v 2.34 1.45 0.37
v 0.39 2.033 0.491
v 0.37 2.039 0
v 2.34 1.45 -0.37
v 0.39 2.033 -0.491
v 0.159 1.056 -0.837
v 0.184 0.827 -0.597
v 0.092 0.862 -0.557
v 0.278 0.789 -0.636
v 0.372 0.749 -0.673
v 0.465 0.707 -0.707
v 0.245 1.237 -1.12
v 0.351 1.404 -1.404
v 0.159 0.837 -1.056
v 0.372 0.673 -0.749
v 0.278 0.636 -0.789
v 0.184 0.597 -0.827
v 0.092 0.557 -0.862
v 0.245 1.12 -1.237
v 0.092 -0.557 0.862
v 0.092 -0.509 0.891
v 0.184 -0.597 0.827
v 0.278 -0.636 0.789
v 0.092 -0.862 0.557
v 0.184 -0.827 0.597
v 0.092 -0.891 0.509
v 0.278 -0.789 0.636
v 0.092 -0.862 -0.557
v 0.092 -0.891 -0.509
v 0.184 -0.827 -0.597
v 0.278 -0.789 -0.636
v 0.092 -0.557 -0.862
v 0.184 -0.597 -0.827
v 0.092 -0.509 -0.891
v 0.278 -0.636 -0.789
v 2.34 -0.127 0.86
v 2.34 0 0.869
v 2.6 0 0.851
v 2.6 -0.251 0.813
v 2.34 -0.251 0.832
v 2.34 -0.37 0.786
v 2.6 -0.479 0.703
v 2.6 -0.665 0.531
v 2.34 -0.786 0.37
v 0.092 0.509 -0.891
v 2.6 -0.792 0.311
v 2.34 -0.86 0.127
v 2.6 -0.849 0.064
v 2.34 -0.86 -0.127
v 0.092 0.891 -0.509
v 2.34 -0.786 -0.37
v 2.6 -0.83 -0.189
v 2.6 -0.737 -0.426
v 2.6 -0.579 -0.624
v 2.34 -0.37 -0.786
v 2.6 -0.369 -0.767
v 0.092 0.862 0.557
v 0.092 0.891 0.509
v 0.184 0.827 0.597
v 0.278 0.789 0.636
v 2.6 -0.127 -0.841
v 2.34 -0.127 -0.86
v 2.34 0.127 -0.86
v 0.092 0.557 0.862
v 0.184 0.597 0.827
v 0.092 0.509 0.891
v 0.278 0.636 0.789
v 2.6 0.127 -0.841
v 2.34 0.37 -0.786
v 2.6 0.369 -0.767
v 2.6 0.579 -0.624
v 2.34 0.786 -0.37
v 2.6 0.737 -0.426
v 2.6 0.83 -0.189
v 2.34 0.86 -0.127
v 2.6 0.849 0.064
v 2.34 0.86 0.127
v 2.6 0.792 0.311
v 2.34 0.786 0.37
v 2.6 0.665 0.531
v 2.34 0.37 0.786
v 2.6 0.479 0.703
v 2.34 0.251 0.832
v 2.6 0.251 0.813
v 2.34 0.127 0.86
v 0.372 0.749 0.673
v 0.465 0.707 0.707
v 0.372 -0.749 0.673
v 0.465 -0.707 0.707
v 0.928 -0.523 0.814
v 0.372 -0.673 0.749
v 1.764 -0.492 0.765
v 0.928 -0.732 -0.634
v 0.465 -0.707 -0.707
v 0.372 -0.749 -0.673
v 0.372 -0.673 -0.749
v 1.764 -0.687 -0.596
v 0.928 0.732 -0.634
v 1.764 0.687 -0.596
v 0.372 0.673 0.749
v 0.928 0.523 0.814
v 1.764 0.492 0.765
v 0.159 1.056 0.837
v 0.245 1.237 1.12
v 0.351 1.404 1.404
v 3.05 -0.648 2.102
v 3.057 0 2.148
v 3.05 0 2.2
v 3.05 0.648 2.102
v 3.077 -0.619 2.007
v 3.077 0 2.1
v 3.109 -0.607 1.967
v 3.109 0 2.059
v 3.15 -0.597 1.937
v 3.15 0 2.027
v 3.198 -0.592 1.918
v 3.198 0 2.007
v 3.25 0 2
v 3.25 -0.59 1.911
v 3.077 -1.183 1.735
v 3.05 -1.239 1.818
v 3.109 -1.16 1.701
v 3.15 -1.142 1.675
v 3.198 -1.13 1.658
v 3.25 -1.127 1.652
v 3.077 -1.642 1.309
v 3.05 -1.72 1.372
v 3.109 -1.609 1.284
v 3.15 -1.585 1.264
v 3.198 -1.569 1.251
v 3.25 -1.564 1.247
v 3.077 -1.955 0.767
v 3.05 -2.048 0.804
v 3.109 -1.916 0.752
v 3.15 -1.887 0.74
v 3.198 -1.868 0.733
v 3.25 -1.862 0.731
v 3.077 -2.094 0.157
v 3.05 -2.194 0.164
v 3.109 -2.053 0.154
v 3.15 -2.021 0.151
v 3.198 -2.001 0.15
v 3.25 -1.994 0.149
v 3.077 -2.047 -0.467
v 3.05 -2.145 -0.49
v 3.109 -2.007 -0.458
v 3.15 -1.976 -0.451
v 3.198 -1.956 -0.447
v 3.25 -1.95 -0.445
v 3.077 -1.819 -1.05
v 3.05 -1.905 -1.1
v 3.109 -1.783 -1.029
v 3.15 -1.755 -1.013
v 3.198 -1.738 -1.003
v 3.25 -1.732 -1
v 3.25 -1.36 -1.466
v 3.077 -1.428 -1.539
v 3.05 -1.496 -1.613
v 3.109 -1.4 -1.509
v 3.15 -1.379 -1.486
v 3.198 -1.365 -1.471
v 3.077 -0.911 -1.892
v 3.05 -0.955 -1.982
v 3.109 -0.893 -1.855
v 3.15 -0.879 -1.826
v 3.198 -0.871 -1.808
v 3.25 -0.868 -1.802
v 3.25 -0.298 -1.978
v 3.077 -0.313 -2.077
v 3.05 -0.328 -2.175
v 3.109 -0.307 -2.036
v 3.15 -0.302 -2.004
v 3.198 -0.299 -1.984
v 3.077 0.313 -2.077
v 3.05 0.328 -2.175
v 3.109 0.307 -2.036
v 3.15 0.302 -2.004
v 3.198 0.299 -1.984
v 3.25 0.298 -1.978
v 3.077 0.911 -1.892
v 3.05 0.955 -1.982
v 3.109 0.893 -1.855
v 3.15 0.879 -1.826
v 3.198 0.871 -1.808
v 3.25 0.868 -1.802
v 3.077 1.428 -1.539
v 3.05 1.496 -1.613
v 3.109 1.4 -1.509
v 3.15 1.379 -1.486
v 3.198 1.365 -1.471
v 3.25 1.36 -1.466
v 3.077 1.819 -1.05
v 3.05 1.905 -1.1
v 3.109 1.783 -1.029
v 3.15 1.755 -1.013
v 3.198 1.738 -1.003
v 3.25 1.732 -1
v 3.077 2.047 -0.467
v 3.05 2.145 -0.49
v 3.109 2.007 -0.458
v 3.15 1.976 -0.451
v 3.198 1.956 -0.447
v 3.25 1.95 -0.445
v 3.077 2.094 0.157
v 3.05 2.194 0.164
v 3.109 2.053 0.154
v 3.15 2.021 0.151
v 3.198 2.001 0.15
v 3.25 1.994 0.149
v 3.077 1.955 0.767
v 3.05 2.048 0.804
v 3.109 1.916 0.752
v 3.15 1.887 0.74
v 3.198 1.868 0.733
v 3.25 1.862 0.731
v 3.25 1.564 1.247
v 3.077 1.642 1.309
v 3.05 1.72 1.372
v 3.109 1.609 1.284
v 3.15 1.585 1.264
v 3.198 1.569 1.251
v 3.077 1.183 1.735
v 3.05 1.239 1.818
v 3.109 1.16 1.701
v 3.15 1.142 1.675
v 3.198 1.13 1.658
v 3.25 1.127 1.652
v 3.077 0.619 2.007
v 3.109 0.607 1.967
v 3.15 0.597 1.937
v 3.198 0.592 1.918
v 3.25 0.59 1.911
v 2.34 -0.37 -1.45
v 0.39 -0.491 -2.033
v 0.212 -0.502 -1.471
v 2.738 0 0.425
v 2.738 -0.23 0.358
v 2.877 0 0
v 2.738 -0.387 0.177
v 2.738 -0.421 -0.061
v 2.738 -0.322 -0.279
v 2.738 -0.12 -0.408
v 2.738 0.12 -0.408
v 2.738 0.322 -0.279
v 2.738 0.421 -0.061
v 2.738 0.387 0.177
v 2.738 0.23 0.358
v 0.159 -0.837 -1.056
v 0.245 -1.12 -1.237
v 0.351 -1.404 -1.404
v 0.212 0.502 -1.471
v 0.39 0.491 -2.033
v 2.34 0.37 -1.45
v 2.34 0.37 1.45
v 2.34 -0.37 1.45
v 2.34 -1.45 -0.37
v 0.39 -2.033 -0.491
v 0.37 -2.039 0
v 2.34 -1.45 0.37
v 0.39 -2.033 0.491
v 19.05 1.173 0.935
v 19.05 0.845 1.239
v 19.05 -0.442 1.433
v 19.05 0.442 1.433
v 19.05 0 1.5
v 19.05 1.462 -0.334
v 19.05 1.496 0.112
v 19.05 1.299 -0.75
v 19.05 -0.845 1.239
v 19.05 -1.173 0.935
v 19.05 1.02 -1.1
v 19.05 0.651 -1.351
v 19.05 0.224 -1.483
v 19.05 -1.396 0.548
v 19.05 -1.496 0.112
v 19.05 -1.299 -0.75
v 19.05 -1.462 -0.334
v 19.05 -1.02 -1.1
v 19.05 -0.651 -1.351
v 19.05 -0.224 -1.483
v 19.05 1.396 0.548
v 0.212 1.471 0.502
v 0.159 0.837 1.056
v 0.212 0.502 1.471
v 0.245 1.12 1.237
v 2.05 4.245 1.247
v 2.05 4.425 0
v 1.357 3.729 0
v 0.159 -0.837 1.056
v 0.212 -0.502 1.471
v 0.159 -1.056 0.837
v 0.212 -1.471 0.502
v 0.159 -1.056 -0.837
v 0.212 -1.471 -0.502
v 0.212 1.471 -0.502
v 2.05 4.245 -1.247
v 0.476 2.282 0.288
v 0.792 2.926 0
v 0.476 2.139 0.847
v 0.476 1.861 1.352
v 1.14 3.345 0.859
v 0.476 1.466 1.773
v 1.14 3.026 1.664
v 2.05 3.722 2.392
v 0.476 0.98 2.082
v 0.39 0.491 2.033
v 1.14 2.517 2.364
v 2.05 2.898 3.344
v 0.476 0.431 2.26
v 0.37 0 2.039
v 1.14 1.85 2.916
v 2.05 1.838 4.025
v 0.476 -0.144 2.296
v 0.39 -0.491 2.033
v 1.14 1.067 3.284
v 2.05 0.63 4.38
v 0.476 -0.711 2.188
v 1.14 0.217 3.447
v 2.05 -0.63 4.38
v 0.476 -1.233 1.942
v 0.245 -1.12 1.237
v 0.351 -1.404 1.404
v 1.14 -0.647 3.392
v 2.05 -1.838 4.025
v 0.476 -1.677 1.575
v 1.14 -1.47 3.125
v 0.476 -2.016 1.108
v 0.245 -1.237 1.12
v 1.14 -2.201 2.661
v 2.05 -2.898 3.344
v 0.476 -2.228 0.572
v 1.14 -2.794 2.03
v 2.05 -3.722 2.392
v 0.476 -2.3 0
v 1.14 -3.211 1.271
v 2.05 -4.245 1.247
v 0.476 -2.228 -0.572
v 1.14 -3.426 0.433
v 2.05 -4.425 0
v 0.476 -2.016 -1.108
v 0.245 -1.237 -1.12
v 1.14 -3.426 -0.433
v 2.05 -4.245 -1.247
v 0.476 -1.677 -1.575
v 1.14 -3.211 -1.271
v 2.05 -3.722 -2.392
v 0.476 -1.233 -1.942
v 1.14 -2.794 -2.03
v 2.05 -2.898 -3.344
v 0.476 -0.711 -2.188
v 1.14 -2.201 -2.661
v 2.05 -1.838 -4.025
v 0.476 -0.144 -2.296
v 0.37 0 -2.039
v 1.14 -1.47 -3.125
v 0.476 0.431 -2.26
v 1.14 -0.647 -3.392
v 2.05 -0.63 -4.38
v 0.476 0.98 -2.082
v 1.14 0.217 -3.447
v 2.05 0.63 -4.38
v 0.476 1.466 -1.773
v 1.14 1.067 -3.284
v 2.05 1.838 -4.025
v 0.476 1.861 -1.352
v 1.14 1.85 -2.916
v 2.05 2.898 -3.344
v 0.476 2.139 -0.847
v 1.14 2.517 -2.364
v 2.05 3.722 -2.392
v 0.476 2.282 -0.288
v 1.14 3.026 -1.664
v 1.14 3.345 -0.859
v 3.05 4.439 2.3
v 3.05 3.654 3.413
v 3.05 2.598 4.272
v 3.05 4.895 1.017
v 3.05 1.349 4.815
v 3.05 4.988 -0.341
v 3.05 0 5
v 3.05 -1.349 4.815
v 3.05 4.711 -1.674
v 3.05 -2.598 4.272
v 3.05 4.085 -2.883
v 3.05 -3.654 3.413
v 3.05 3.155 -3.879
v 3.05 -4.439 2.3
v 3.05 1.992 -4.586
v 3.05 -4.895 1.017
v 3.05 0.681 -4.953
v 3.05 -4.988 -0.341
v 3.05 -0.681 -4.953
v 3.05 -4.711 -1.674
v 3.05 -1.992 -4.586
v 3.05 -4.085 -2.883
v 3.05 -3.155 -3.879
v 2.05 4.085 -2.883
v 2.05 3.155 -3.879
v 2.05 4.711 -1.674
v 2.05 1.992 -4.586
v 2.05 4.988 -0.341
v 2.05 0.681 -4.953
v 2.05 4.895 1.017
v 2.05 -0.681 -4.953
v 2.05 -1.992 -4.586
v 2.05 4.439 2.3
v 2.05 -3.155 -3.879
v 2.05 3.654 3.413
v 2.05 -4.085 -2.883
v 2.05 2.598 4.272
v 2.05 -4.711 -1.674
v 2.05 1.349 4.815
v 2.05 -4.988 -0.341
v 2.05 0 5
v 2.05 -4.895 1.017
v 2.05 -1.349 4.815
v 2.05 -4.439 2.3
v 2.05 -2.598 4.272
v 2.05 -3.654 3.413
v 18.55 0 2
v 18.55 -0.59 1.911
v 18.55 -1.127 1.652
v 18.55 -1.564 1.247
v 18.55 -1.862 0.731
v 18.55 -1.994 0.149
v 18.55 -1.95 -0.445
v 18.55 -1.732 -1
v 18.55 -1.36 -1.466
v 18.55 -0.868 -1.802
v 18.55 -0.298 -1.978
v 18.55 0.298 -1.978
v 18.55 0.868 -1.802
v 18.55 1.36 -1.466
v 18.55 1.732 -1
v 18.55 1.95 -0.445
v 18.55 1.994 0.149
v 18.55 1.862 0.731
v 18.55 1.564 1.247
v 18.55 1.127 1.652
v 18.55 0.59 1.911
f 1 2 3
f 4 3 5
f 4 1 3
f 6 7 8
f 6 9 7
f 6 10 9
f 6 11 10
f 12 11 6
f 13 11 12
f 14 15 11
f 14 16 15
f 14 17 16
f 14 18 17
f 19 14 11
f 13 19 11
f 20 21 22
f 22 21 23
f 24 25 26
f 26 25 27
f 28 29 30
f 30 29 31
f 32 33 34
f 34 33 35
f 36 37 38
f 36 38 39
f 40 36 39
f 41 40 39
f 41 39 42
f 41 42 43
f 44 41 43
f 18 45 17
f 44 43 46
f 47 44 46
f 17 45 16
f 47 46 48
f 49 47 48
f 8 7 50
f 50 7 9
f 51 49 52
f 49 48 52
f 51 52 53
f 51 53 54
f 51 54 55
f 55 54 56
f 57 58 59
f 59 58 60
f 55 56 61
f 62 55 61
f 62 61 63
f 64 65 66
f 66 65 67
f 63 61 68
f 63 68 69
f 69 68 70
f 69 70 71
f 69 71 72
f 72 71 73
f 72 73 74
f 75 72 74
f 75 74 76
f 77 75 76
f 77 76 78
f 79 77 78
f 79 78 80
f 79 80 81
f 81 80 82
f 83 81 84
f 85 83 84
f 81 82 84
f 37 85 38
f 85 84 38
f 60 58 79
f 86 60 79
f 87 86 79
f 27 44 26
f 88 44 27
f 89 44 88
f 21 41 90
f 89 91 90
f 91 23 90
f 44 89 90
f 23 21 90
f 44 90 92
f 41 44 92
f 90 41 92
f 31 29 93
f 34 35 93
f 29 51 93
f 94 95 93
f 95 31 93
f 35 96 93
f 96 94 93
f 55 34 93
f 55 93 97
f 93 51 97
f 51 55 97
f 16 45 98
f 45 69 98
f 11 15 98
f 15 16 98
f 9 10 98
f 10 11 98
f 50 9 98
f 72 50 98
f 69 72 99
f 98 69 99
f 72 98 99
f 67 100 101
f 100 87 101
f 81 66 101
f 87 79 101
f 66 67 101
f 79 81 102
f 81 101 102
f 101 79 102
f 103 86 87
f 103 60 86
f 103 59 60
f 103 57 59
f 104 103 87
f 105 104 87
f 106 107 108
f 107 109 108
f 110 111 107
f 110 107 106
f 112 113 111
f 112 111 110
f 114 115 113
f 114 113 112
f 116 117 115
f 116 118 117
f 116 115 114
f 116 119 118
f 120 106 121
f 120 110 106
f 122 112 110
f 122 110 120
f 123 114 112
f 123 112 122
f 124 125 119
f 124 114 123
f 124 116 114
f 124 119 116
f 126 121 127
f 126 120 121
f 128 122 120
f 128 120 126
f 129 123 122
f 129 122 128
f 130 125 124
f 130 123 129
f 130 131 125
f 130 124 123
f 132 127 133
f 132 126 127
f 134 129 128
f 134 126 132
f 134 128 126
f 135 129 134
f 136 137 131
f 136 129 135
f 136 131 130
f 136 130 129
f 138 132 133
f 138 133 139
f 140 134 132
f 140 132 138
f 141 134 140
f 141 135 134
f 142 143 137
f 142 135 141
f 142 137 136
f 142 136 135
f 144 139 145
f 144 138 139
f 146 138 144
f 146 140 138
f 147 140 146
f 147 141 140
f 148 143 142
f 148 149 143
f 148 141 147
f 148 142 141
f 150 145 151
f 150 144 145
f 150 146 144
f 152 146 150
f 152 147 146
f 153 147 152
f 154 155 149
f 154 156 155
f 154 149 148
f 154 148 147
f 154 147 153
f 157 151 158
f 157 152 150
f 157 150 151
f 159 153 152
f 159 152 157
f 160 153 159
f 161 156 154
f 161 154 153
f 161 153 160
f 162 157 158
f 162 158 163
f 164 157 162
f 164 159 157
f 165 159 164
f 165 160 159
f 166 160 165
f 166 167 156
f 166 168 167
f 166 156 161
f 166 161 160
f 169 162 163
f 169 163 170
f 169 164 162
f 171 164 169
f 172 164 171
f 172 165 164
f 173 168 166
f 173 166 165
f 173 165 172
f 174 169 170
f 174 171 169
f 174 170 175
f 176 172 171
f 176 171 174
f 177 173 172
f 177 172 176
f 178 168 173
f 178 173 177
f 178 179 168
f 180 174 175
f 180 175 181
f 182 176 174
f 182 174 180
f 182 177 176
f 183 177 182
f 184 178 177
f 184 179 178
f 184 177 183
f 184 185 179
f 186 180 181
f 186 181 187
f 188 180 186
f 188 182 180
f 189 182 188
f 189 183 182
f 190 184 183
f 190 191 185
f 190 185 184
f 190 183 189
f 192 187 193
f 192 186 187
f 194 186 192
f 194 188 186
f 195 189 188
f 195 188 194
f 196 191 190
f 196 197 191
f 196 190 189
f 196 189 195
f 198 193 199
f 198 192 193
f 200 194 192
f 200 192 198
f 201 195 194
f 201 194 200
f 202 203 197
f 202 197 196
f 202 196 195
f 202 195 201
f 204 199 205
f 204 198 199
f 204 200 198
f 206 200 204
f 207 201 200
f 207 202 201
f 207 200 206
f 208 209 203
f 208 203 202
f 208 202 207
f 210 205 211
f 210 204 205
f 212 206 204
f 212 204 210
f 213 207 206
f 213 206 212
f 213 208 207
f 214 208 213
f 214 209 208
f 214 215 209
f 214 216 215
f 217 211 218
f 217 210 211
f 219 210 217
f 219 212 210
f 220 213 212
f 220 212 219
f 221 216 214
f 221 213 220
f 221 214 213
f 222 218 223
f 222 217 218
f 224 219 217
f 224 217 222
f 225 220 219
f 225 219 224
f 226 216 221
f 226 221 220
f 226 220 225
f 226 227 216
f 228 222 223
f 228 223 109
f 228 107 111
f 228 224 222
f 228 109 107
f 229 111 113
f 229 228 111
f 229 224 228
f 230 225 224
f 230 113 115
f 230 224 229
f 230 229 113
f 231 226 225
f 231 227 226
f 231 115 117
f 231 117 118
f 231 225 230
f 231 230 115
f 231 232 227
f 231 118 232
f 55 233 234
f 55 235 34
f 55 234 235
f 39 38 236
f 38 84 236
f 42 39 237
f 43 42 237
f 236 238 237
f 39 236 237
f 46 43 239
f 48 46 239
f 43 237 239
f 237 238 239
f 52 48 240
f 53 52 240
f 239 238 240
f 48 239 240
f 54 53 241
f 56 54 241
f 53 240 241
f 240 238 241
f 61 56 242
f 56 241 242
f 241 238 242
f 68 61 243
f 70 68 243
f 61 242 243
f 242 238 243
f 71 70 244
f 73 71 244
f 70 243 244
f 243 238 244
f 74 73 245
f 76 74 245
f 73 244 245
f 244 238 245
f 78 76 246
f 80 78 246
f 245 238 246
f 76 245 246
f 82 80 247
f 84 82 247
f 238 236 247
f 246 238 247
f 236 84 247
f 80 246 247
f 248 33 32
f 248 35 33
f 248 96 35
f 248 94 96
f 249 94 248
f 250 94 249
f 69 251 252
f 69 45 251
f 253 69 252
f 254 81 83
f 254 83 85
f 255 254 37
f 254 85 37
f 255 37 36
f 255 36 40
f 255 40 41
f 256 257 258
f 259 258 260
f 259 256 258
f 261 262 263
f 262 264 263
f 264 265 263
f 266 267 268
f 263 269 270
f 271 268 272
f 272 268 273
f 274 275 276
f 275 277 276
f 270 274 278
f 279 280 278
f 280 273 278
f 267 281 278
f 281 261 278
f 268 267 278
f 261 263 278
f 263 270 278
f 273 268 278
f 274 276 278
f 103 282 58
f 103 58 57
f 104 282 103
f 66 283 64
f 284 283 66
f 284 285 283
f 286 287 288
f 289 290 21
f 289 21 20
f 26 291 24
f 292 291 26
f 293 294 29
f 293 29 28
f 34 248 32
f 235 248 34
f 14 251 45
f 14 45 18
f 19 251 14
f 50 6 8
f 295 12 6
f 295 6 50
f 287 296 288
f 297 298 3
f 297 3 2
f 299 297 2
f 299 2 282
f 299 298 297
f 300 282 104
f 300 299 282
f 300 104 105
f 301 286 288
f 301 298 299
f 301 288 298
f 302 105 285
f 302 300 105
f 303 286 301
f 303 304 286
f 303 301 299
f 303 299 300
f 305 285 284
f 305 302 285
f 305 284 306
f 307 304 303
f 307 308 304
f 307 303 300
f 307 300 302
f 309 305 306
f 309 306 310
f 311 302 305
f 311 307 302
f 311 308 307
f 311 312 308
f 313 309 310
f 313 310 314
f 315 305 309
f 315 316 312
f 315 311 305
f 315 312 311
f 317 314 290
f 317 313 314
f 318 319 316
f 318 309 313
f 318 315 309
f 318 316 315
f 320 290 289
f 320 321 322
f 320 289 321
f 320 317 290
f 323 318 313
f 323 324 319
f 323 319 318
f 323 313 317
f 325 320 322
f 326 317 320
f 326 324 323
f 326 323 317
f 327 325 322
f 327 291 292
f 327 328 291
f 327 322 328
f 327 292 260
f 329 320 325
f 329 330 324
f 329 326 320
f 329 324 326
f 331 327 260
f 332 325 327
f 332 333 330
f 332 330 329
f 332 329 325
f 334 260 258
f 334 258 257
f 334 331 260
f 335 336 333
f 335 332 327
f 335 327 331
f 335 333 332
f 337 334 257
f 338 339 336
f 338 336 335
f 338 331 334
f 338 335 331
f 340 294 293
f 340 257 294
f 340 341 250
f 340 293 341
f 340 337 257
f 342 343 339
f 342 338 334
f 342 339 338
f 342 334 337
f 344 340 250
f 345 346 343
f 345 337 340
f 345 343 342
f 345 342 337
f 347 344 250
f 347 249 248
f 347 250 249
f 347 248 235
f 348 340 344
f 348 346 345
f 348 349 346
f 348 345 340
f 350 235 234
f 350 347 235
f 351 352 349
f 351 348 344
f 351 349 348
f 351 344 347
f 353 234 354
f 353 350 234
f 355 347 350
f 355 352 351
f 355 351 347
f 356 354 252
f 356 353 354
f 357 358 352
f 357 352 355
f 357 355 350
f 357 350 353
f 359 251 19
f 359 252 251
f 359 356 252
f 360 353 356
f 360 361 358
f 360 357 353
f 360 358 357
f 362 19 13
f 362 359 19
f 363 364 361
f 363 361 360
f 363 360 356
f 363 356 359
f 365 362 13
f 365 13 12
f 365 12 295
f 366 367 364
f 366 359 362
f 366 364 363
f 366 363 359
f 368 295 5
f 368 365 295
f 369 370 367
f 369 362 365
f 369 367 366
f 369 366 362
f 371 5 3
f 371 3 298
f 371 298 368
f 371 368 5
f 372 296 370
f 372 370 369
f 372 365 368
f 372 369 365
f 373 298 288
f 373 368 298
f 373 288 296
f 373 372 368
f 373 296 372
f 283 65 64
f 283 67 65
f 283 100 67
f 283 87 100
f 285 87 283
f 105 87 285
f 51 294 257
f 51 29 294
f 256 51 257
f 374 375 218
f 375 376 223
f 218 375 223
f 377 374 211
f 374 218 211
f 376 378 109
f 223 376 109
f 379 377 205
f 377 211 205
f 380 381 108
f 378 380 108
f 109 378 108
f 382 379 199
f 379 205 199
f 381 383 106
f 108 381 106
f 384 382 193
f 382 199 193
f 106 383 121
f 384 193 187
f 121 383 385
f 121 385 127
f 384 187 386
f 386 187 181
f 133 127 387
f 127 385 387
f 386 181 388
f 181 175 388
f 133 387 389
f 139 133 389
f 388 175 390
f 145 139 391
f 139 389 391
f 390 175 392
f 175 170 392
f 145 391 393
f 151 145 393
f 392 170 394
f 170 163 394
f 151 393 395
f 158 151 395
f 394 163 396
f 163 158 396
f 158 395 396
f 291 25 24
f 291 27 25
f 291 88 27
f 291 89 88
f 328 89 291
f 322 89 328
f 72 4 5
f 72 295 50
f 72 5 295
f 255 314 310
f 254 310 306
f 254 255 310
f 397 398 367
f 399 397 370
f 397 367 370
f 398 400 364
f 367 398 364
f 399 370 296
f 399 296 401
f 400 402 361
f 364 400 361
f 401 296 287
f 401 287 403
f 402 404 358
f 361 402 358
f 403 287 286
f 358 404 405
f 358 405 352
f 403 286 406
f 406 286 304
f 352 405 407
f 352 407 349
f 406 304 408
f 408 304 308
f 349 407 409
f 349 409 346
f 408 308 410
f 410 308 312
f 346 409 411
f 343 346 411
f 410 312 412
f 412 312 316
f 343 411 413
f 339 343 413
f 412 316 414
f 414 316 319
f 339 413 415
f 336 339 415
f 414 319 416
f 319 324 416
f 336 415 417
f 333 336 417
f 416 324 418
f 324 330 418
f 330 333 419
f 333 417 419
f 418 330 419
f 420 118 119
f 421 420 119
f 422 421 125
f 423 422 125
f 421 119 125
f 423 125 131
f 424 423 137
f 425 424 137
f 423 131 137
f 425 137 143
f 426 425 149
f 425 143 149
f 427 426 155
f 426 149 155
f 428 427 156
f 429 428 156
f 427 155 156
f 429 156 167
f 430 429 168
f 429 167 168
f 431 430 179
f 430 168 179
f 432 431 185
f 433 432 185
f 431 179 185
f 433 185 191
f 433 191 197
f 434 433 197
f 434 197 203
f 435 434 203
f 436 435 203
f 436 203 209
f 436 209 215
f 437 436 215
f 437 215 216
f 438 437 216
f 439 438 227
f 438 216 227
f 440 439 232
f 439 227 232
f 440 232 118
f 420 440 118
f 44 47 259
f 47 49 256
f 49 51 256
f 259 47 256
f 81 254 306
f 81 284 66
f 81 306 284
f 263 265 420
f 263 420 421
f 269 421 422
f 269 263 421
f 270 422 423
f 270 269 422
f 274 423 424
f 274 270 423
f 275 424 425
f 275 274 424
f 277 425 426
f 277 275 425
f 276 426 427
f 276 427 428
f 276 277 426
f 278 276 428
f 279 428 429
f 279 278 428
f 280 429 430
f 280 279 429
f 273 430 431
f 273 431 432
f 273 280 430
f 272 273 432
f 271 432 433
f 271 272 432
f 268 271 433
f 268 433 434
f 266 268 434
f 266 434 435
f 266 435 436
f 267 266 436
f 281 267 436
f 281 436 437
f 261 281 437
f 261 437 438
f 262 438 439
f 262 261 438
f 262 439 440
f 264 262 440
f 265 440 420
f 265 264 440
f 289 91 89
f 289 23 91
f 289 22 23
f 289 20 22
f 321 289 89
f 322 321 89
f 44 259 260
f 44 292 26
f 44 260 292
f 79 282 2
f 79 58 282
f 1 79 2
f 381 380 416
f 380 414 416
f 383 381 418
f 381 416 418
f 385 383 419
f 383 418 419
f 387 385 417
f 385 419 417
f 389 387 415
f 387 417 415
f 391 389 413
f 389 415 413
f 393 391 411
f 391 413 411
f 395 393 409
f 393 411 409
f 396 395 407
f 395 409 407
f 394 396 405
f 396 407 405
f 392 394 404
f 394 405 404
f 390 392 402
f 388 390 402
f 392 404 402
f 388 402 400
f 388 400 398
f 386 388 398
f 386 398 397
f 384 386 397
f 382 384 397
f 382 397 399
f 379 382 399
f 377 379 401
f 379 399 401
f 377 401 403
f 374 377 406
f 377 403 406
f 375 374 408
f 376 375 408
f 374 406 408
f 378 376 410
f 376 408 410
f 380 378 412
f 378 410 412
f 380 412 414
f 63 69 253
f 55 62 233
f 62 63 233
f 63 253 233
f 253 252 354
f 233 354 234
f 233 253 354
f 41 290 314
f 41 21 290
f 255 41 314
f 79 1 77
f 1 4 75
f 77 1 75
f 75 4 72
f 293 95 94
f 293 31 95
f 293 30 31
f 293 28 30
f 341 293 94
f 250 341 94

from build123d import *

# Parameters (mm, degrees)
FILLET1_R             = 0.2
RECPAT_COUNT          = 2
RECPAT_ANGLE          = 90
CHAMFER_1_SIZE        = 0.5
CUT_EXTRUDE_START     = -1.932317225
CUT_EXTRUDE_1_DEPTH   = 0.992538955
CUT_EXTRUDE_1_2_DEPTH = 0.992538955
CUT_EXTRUDE_1_3_DEPTH = 0.992538955
CUT_EXTRUDE_1_4_DEPTH = 0.992538955


# Read off the part's stored shape, not the designer's step: Вытянуть1
with BuildPart() as part:
    # BodySke → Base-Revolve (revolve)
    with BuildSketch(Plane.XY, mode=Mode.PRIVATE) as base_revolve_sk:
        Polygon((3.05, 2), (3.05, 5), (2.05, 5), (2.05, 0), (19.05, 0), (19.05, 2), align=None)
    revolve(base_revolve_sk.sketch.rotate(Axis((-6.35, 0, 0), (1, 0, 0)), 90), axis=Axis((-6.35, 0, 0), (1, 0, 0)))

    # Fillet1
    fillet1_edges = [part.edges().sort_by_distance(p)[0] for p in [
        (3.05, 0, -2),
    ]]
    fillet(fillet1_edges, radius=FILLET1_R)

    # PanSke → Pan (revolve)
    with BuildSketch(Plane.XY):
        with BuildLine():
            Line((2.05, 4.424646879), (2.05, 0))
            Line((2.05, 0), (0, 0))
            ThreePointArc((0, 0), (0.537396082, 2.438237068), (2.05, 4.424646879))
        make_face()
    revolve(axis=Axis((0, 0, 0), (1, 0, 0)))

    # Sketch3 → Recess section 0
    with BuildSketch(Plane(origin=(0, 0, 0), x_dir=(0, 0, -1), z_dir=(1, 0, 0))):
        with BuildLine():
            Line((-0.515, 2.15), (0.515, 2.15))
            Line((0.515, 2.15), (0.515, -2.15))
            Line((0.515, -2.15), (-0.515, -2.15))
            Line((-0.515, -2.15), (-0.515, 2.15))
        make_face()
    # Sketch4 → Recess section 1
    with BuildSketch(Plane(origin=(2.34, 0, 0), x_dir=(0, 0, -1), z_dir=(1, 0, 0))):
        with BuildLine():
            Line((-0.37, 1.45), (0.37, 1.45))
            Line((0.37, 1.45), (0.37, -1.45))
            Line((0.37, -1.45), (-0.37, -1.45))
            Line((-0.37, -1.45), (-0.37, 1.45))
        make_face()
    recess = loft(mode=Mode.SUBTRACT)

    # RecPat: Recess ×2 about axis
    recpat_axis = Axis((0, 0, 0), (1, 0, 0))
    for i in range(1, RECPAT_COUNT):
        add(recess.rotate(recpat_axis, i * RECPAT_ANGLE / (RECPAT_COUNT - 1)), mode=Mode.SUBTRACT)

    # RecCorSke → RecessCore (revolve, cut)
    with BuildSketch(Plane.XY, mode=Mode.PRIVATE) as recesscore_sk:
        Polygon((0, 0), (0, 1.032809711), (2.6, 0.851), (2.876506661, 0), align=None)
    revolve(recesscore_sk.sketch.rotate(Axis((-3.175, 0, 0), (1, 0, 0)), 90), axis=Axis((-3.175, 0, 0), (1, 0, 0)), mode=Mode.SUBTRACT)

    # Фаска1
    chamfer_1_edges = [part.edges().sort_by_distance(p)[0] for p in [
        (19.05, 0, -2),
    ]]
    chamfer(chamfer_1_edges, length=CHAMFER_1_SIZE)

    # Вытянуть1 outline → Вытянуть1 (cut)
    with BuildSketch(Plane(origin=(0, 0, 0), x_dir=(0.9932989193126689, -0.08172287590474257, -0.08172287590474261), z_dir=(0.1155735994606204, 0.7023684015912574, 0.7023684015912578)).offset(CUT_EXTRUDE_START)):
        Polygon((-1, -0.919204654), (0.206895578, -0.216114133), (0.577867997, 0), (0.206895578, 0.216114133), (-1, 0.919204654), align=None)
    extrude(amount=CUT_EXTRUDE_1_DEPTH, mode=Mode.SUBTRACT)

    # Cut-Extrude 1 2 outline → Cut-Extrude 1 2 (cut)
    with BuildSketch(Plane(origin=(0, 0, 0), x_dir=(0.9932989193126689, -0.08172287590474257, 0.08172287590474261), z_dir=(0.1155735994606204, 0.7023684015912574, -0.7023684015912578)).offset(CUT_EXTRUDE_START)):
        Polygon((0.206895578, -0.216114133), (0.577867997, 0), (0.206895578, 0.216114133), (-1, 0.919204654), (-1, -0.919204654), align=None)
    extrude(amount=CUT_EXTRUDE_1_2_DEPTH, mode=Mode.SUBTRACT)

    # Cut-Extrude 1 3 outline → Cut-Extrude 1 3 (cut)
    with BuildSketch(Plane(origin=(0, 0, 0), x_dir=(0.9932989193126689, 0.08172287590474257, 0.08172287590474261), z_dir=(0.1155735994606204, -0.7023684015912574, -0.7023684015912578)).offset(CUT_EXTRUDE_START)):
        Polygon((0.206895578, -0.216114133), (0.577867997, 0), (0.206895578, 0.216114133), (-1, 0.919204654), (-1, -0.919204654), align=None)
    extrude(amount=CUT_EXTRUDE_1_3_DEPTH, mode=Mode.SUBTRACT)

    # Cut-Extrude 1 4 outline → Cut-Extrude 1 4 (cut)
    with BuildSketch(Plane(origin=(0, 0, 0), x_dir=(0.9932989193126689, 0.08172287590474257, -0.08172287590474261), z_dir=(0.1155735994606204, -0.7023684015912574, 0.7023684015912578)).offset(CUT_EXTRUDE_START)):
        Polygon((-1, -0.919204654), (0.206895578, -0.216114133), (0.577867997, 0), (0.206895578, 0.216114133), (-1, 0.919204654), align=None)
    extrude(amount=CUT_EXTRUDE_1_4_DEPTH, mode=Mode.SUBTRACT)


solid = part.part
